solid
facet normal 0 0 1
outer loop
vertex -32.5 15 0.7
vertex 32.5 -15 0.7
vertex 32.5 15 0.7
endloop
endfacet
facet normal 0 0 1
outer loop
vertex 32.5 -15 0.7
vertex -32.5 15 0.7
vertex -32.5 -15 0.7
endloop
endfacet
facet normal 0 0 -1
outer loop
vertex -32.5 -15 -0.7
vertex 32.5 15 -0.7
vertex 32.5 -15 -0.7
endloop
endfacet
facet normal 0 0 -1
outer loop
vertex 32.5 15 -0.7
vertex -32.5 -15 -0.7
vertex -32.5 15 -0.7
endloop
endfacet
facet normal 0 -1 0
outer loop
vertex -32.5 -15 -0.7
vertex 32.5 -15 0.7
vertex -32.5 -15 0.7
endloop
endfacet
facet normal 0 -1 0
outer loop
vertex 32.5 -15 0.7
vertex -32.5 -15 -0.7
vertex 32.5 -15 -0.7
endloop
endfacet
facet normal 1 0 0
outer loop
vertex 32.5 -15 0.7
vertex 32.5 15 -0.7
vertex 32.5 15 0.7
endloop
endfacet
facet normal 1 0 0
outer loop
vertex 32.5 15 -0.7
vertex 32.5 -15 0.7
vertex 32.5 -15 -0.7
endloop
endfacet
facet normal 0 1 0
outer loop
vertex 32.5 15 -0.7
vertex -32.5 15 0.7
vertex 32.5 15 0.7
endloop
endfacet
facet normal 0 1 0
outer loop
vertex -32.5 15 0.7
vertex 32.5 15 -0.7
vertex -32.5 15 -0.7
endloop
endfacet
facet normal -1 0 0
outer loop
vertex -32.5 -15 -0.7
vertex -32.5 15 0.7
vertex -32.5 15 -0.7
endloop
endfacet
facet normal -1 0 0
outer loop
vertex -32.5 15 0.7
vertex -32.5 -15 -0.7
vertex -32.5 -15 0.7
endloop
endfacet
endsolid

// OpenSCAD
// Parameters
pcb_length = 65; //[32.5:130:0.1]
pcb_width = 30; //[15:60:0.1]
pcb_thickness = 1.4; //[0.7:2.8:0.1]

// Main PCB Body
module pcb_main_body() {
  color([0.0, 0.4, 0.2]) // Green color for PCB
  cube([pcb_length, pcb_width, pcb_thickness], center=true);
}

// Complete SBC Model
module sbc_complete_model() {
  pcb_main_body();
}

// Render the final model
sbc_complete_model();
